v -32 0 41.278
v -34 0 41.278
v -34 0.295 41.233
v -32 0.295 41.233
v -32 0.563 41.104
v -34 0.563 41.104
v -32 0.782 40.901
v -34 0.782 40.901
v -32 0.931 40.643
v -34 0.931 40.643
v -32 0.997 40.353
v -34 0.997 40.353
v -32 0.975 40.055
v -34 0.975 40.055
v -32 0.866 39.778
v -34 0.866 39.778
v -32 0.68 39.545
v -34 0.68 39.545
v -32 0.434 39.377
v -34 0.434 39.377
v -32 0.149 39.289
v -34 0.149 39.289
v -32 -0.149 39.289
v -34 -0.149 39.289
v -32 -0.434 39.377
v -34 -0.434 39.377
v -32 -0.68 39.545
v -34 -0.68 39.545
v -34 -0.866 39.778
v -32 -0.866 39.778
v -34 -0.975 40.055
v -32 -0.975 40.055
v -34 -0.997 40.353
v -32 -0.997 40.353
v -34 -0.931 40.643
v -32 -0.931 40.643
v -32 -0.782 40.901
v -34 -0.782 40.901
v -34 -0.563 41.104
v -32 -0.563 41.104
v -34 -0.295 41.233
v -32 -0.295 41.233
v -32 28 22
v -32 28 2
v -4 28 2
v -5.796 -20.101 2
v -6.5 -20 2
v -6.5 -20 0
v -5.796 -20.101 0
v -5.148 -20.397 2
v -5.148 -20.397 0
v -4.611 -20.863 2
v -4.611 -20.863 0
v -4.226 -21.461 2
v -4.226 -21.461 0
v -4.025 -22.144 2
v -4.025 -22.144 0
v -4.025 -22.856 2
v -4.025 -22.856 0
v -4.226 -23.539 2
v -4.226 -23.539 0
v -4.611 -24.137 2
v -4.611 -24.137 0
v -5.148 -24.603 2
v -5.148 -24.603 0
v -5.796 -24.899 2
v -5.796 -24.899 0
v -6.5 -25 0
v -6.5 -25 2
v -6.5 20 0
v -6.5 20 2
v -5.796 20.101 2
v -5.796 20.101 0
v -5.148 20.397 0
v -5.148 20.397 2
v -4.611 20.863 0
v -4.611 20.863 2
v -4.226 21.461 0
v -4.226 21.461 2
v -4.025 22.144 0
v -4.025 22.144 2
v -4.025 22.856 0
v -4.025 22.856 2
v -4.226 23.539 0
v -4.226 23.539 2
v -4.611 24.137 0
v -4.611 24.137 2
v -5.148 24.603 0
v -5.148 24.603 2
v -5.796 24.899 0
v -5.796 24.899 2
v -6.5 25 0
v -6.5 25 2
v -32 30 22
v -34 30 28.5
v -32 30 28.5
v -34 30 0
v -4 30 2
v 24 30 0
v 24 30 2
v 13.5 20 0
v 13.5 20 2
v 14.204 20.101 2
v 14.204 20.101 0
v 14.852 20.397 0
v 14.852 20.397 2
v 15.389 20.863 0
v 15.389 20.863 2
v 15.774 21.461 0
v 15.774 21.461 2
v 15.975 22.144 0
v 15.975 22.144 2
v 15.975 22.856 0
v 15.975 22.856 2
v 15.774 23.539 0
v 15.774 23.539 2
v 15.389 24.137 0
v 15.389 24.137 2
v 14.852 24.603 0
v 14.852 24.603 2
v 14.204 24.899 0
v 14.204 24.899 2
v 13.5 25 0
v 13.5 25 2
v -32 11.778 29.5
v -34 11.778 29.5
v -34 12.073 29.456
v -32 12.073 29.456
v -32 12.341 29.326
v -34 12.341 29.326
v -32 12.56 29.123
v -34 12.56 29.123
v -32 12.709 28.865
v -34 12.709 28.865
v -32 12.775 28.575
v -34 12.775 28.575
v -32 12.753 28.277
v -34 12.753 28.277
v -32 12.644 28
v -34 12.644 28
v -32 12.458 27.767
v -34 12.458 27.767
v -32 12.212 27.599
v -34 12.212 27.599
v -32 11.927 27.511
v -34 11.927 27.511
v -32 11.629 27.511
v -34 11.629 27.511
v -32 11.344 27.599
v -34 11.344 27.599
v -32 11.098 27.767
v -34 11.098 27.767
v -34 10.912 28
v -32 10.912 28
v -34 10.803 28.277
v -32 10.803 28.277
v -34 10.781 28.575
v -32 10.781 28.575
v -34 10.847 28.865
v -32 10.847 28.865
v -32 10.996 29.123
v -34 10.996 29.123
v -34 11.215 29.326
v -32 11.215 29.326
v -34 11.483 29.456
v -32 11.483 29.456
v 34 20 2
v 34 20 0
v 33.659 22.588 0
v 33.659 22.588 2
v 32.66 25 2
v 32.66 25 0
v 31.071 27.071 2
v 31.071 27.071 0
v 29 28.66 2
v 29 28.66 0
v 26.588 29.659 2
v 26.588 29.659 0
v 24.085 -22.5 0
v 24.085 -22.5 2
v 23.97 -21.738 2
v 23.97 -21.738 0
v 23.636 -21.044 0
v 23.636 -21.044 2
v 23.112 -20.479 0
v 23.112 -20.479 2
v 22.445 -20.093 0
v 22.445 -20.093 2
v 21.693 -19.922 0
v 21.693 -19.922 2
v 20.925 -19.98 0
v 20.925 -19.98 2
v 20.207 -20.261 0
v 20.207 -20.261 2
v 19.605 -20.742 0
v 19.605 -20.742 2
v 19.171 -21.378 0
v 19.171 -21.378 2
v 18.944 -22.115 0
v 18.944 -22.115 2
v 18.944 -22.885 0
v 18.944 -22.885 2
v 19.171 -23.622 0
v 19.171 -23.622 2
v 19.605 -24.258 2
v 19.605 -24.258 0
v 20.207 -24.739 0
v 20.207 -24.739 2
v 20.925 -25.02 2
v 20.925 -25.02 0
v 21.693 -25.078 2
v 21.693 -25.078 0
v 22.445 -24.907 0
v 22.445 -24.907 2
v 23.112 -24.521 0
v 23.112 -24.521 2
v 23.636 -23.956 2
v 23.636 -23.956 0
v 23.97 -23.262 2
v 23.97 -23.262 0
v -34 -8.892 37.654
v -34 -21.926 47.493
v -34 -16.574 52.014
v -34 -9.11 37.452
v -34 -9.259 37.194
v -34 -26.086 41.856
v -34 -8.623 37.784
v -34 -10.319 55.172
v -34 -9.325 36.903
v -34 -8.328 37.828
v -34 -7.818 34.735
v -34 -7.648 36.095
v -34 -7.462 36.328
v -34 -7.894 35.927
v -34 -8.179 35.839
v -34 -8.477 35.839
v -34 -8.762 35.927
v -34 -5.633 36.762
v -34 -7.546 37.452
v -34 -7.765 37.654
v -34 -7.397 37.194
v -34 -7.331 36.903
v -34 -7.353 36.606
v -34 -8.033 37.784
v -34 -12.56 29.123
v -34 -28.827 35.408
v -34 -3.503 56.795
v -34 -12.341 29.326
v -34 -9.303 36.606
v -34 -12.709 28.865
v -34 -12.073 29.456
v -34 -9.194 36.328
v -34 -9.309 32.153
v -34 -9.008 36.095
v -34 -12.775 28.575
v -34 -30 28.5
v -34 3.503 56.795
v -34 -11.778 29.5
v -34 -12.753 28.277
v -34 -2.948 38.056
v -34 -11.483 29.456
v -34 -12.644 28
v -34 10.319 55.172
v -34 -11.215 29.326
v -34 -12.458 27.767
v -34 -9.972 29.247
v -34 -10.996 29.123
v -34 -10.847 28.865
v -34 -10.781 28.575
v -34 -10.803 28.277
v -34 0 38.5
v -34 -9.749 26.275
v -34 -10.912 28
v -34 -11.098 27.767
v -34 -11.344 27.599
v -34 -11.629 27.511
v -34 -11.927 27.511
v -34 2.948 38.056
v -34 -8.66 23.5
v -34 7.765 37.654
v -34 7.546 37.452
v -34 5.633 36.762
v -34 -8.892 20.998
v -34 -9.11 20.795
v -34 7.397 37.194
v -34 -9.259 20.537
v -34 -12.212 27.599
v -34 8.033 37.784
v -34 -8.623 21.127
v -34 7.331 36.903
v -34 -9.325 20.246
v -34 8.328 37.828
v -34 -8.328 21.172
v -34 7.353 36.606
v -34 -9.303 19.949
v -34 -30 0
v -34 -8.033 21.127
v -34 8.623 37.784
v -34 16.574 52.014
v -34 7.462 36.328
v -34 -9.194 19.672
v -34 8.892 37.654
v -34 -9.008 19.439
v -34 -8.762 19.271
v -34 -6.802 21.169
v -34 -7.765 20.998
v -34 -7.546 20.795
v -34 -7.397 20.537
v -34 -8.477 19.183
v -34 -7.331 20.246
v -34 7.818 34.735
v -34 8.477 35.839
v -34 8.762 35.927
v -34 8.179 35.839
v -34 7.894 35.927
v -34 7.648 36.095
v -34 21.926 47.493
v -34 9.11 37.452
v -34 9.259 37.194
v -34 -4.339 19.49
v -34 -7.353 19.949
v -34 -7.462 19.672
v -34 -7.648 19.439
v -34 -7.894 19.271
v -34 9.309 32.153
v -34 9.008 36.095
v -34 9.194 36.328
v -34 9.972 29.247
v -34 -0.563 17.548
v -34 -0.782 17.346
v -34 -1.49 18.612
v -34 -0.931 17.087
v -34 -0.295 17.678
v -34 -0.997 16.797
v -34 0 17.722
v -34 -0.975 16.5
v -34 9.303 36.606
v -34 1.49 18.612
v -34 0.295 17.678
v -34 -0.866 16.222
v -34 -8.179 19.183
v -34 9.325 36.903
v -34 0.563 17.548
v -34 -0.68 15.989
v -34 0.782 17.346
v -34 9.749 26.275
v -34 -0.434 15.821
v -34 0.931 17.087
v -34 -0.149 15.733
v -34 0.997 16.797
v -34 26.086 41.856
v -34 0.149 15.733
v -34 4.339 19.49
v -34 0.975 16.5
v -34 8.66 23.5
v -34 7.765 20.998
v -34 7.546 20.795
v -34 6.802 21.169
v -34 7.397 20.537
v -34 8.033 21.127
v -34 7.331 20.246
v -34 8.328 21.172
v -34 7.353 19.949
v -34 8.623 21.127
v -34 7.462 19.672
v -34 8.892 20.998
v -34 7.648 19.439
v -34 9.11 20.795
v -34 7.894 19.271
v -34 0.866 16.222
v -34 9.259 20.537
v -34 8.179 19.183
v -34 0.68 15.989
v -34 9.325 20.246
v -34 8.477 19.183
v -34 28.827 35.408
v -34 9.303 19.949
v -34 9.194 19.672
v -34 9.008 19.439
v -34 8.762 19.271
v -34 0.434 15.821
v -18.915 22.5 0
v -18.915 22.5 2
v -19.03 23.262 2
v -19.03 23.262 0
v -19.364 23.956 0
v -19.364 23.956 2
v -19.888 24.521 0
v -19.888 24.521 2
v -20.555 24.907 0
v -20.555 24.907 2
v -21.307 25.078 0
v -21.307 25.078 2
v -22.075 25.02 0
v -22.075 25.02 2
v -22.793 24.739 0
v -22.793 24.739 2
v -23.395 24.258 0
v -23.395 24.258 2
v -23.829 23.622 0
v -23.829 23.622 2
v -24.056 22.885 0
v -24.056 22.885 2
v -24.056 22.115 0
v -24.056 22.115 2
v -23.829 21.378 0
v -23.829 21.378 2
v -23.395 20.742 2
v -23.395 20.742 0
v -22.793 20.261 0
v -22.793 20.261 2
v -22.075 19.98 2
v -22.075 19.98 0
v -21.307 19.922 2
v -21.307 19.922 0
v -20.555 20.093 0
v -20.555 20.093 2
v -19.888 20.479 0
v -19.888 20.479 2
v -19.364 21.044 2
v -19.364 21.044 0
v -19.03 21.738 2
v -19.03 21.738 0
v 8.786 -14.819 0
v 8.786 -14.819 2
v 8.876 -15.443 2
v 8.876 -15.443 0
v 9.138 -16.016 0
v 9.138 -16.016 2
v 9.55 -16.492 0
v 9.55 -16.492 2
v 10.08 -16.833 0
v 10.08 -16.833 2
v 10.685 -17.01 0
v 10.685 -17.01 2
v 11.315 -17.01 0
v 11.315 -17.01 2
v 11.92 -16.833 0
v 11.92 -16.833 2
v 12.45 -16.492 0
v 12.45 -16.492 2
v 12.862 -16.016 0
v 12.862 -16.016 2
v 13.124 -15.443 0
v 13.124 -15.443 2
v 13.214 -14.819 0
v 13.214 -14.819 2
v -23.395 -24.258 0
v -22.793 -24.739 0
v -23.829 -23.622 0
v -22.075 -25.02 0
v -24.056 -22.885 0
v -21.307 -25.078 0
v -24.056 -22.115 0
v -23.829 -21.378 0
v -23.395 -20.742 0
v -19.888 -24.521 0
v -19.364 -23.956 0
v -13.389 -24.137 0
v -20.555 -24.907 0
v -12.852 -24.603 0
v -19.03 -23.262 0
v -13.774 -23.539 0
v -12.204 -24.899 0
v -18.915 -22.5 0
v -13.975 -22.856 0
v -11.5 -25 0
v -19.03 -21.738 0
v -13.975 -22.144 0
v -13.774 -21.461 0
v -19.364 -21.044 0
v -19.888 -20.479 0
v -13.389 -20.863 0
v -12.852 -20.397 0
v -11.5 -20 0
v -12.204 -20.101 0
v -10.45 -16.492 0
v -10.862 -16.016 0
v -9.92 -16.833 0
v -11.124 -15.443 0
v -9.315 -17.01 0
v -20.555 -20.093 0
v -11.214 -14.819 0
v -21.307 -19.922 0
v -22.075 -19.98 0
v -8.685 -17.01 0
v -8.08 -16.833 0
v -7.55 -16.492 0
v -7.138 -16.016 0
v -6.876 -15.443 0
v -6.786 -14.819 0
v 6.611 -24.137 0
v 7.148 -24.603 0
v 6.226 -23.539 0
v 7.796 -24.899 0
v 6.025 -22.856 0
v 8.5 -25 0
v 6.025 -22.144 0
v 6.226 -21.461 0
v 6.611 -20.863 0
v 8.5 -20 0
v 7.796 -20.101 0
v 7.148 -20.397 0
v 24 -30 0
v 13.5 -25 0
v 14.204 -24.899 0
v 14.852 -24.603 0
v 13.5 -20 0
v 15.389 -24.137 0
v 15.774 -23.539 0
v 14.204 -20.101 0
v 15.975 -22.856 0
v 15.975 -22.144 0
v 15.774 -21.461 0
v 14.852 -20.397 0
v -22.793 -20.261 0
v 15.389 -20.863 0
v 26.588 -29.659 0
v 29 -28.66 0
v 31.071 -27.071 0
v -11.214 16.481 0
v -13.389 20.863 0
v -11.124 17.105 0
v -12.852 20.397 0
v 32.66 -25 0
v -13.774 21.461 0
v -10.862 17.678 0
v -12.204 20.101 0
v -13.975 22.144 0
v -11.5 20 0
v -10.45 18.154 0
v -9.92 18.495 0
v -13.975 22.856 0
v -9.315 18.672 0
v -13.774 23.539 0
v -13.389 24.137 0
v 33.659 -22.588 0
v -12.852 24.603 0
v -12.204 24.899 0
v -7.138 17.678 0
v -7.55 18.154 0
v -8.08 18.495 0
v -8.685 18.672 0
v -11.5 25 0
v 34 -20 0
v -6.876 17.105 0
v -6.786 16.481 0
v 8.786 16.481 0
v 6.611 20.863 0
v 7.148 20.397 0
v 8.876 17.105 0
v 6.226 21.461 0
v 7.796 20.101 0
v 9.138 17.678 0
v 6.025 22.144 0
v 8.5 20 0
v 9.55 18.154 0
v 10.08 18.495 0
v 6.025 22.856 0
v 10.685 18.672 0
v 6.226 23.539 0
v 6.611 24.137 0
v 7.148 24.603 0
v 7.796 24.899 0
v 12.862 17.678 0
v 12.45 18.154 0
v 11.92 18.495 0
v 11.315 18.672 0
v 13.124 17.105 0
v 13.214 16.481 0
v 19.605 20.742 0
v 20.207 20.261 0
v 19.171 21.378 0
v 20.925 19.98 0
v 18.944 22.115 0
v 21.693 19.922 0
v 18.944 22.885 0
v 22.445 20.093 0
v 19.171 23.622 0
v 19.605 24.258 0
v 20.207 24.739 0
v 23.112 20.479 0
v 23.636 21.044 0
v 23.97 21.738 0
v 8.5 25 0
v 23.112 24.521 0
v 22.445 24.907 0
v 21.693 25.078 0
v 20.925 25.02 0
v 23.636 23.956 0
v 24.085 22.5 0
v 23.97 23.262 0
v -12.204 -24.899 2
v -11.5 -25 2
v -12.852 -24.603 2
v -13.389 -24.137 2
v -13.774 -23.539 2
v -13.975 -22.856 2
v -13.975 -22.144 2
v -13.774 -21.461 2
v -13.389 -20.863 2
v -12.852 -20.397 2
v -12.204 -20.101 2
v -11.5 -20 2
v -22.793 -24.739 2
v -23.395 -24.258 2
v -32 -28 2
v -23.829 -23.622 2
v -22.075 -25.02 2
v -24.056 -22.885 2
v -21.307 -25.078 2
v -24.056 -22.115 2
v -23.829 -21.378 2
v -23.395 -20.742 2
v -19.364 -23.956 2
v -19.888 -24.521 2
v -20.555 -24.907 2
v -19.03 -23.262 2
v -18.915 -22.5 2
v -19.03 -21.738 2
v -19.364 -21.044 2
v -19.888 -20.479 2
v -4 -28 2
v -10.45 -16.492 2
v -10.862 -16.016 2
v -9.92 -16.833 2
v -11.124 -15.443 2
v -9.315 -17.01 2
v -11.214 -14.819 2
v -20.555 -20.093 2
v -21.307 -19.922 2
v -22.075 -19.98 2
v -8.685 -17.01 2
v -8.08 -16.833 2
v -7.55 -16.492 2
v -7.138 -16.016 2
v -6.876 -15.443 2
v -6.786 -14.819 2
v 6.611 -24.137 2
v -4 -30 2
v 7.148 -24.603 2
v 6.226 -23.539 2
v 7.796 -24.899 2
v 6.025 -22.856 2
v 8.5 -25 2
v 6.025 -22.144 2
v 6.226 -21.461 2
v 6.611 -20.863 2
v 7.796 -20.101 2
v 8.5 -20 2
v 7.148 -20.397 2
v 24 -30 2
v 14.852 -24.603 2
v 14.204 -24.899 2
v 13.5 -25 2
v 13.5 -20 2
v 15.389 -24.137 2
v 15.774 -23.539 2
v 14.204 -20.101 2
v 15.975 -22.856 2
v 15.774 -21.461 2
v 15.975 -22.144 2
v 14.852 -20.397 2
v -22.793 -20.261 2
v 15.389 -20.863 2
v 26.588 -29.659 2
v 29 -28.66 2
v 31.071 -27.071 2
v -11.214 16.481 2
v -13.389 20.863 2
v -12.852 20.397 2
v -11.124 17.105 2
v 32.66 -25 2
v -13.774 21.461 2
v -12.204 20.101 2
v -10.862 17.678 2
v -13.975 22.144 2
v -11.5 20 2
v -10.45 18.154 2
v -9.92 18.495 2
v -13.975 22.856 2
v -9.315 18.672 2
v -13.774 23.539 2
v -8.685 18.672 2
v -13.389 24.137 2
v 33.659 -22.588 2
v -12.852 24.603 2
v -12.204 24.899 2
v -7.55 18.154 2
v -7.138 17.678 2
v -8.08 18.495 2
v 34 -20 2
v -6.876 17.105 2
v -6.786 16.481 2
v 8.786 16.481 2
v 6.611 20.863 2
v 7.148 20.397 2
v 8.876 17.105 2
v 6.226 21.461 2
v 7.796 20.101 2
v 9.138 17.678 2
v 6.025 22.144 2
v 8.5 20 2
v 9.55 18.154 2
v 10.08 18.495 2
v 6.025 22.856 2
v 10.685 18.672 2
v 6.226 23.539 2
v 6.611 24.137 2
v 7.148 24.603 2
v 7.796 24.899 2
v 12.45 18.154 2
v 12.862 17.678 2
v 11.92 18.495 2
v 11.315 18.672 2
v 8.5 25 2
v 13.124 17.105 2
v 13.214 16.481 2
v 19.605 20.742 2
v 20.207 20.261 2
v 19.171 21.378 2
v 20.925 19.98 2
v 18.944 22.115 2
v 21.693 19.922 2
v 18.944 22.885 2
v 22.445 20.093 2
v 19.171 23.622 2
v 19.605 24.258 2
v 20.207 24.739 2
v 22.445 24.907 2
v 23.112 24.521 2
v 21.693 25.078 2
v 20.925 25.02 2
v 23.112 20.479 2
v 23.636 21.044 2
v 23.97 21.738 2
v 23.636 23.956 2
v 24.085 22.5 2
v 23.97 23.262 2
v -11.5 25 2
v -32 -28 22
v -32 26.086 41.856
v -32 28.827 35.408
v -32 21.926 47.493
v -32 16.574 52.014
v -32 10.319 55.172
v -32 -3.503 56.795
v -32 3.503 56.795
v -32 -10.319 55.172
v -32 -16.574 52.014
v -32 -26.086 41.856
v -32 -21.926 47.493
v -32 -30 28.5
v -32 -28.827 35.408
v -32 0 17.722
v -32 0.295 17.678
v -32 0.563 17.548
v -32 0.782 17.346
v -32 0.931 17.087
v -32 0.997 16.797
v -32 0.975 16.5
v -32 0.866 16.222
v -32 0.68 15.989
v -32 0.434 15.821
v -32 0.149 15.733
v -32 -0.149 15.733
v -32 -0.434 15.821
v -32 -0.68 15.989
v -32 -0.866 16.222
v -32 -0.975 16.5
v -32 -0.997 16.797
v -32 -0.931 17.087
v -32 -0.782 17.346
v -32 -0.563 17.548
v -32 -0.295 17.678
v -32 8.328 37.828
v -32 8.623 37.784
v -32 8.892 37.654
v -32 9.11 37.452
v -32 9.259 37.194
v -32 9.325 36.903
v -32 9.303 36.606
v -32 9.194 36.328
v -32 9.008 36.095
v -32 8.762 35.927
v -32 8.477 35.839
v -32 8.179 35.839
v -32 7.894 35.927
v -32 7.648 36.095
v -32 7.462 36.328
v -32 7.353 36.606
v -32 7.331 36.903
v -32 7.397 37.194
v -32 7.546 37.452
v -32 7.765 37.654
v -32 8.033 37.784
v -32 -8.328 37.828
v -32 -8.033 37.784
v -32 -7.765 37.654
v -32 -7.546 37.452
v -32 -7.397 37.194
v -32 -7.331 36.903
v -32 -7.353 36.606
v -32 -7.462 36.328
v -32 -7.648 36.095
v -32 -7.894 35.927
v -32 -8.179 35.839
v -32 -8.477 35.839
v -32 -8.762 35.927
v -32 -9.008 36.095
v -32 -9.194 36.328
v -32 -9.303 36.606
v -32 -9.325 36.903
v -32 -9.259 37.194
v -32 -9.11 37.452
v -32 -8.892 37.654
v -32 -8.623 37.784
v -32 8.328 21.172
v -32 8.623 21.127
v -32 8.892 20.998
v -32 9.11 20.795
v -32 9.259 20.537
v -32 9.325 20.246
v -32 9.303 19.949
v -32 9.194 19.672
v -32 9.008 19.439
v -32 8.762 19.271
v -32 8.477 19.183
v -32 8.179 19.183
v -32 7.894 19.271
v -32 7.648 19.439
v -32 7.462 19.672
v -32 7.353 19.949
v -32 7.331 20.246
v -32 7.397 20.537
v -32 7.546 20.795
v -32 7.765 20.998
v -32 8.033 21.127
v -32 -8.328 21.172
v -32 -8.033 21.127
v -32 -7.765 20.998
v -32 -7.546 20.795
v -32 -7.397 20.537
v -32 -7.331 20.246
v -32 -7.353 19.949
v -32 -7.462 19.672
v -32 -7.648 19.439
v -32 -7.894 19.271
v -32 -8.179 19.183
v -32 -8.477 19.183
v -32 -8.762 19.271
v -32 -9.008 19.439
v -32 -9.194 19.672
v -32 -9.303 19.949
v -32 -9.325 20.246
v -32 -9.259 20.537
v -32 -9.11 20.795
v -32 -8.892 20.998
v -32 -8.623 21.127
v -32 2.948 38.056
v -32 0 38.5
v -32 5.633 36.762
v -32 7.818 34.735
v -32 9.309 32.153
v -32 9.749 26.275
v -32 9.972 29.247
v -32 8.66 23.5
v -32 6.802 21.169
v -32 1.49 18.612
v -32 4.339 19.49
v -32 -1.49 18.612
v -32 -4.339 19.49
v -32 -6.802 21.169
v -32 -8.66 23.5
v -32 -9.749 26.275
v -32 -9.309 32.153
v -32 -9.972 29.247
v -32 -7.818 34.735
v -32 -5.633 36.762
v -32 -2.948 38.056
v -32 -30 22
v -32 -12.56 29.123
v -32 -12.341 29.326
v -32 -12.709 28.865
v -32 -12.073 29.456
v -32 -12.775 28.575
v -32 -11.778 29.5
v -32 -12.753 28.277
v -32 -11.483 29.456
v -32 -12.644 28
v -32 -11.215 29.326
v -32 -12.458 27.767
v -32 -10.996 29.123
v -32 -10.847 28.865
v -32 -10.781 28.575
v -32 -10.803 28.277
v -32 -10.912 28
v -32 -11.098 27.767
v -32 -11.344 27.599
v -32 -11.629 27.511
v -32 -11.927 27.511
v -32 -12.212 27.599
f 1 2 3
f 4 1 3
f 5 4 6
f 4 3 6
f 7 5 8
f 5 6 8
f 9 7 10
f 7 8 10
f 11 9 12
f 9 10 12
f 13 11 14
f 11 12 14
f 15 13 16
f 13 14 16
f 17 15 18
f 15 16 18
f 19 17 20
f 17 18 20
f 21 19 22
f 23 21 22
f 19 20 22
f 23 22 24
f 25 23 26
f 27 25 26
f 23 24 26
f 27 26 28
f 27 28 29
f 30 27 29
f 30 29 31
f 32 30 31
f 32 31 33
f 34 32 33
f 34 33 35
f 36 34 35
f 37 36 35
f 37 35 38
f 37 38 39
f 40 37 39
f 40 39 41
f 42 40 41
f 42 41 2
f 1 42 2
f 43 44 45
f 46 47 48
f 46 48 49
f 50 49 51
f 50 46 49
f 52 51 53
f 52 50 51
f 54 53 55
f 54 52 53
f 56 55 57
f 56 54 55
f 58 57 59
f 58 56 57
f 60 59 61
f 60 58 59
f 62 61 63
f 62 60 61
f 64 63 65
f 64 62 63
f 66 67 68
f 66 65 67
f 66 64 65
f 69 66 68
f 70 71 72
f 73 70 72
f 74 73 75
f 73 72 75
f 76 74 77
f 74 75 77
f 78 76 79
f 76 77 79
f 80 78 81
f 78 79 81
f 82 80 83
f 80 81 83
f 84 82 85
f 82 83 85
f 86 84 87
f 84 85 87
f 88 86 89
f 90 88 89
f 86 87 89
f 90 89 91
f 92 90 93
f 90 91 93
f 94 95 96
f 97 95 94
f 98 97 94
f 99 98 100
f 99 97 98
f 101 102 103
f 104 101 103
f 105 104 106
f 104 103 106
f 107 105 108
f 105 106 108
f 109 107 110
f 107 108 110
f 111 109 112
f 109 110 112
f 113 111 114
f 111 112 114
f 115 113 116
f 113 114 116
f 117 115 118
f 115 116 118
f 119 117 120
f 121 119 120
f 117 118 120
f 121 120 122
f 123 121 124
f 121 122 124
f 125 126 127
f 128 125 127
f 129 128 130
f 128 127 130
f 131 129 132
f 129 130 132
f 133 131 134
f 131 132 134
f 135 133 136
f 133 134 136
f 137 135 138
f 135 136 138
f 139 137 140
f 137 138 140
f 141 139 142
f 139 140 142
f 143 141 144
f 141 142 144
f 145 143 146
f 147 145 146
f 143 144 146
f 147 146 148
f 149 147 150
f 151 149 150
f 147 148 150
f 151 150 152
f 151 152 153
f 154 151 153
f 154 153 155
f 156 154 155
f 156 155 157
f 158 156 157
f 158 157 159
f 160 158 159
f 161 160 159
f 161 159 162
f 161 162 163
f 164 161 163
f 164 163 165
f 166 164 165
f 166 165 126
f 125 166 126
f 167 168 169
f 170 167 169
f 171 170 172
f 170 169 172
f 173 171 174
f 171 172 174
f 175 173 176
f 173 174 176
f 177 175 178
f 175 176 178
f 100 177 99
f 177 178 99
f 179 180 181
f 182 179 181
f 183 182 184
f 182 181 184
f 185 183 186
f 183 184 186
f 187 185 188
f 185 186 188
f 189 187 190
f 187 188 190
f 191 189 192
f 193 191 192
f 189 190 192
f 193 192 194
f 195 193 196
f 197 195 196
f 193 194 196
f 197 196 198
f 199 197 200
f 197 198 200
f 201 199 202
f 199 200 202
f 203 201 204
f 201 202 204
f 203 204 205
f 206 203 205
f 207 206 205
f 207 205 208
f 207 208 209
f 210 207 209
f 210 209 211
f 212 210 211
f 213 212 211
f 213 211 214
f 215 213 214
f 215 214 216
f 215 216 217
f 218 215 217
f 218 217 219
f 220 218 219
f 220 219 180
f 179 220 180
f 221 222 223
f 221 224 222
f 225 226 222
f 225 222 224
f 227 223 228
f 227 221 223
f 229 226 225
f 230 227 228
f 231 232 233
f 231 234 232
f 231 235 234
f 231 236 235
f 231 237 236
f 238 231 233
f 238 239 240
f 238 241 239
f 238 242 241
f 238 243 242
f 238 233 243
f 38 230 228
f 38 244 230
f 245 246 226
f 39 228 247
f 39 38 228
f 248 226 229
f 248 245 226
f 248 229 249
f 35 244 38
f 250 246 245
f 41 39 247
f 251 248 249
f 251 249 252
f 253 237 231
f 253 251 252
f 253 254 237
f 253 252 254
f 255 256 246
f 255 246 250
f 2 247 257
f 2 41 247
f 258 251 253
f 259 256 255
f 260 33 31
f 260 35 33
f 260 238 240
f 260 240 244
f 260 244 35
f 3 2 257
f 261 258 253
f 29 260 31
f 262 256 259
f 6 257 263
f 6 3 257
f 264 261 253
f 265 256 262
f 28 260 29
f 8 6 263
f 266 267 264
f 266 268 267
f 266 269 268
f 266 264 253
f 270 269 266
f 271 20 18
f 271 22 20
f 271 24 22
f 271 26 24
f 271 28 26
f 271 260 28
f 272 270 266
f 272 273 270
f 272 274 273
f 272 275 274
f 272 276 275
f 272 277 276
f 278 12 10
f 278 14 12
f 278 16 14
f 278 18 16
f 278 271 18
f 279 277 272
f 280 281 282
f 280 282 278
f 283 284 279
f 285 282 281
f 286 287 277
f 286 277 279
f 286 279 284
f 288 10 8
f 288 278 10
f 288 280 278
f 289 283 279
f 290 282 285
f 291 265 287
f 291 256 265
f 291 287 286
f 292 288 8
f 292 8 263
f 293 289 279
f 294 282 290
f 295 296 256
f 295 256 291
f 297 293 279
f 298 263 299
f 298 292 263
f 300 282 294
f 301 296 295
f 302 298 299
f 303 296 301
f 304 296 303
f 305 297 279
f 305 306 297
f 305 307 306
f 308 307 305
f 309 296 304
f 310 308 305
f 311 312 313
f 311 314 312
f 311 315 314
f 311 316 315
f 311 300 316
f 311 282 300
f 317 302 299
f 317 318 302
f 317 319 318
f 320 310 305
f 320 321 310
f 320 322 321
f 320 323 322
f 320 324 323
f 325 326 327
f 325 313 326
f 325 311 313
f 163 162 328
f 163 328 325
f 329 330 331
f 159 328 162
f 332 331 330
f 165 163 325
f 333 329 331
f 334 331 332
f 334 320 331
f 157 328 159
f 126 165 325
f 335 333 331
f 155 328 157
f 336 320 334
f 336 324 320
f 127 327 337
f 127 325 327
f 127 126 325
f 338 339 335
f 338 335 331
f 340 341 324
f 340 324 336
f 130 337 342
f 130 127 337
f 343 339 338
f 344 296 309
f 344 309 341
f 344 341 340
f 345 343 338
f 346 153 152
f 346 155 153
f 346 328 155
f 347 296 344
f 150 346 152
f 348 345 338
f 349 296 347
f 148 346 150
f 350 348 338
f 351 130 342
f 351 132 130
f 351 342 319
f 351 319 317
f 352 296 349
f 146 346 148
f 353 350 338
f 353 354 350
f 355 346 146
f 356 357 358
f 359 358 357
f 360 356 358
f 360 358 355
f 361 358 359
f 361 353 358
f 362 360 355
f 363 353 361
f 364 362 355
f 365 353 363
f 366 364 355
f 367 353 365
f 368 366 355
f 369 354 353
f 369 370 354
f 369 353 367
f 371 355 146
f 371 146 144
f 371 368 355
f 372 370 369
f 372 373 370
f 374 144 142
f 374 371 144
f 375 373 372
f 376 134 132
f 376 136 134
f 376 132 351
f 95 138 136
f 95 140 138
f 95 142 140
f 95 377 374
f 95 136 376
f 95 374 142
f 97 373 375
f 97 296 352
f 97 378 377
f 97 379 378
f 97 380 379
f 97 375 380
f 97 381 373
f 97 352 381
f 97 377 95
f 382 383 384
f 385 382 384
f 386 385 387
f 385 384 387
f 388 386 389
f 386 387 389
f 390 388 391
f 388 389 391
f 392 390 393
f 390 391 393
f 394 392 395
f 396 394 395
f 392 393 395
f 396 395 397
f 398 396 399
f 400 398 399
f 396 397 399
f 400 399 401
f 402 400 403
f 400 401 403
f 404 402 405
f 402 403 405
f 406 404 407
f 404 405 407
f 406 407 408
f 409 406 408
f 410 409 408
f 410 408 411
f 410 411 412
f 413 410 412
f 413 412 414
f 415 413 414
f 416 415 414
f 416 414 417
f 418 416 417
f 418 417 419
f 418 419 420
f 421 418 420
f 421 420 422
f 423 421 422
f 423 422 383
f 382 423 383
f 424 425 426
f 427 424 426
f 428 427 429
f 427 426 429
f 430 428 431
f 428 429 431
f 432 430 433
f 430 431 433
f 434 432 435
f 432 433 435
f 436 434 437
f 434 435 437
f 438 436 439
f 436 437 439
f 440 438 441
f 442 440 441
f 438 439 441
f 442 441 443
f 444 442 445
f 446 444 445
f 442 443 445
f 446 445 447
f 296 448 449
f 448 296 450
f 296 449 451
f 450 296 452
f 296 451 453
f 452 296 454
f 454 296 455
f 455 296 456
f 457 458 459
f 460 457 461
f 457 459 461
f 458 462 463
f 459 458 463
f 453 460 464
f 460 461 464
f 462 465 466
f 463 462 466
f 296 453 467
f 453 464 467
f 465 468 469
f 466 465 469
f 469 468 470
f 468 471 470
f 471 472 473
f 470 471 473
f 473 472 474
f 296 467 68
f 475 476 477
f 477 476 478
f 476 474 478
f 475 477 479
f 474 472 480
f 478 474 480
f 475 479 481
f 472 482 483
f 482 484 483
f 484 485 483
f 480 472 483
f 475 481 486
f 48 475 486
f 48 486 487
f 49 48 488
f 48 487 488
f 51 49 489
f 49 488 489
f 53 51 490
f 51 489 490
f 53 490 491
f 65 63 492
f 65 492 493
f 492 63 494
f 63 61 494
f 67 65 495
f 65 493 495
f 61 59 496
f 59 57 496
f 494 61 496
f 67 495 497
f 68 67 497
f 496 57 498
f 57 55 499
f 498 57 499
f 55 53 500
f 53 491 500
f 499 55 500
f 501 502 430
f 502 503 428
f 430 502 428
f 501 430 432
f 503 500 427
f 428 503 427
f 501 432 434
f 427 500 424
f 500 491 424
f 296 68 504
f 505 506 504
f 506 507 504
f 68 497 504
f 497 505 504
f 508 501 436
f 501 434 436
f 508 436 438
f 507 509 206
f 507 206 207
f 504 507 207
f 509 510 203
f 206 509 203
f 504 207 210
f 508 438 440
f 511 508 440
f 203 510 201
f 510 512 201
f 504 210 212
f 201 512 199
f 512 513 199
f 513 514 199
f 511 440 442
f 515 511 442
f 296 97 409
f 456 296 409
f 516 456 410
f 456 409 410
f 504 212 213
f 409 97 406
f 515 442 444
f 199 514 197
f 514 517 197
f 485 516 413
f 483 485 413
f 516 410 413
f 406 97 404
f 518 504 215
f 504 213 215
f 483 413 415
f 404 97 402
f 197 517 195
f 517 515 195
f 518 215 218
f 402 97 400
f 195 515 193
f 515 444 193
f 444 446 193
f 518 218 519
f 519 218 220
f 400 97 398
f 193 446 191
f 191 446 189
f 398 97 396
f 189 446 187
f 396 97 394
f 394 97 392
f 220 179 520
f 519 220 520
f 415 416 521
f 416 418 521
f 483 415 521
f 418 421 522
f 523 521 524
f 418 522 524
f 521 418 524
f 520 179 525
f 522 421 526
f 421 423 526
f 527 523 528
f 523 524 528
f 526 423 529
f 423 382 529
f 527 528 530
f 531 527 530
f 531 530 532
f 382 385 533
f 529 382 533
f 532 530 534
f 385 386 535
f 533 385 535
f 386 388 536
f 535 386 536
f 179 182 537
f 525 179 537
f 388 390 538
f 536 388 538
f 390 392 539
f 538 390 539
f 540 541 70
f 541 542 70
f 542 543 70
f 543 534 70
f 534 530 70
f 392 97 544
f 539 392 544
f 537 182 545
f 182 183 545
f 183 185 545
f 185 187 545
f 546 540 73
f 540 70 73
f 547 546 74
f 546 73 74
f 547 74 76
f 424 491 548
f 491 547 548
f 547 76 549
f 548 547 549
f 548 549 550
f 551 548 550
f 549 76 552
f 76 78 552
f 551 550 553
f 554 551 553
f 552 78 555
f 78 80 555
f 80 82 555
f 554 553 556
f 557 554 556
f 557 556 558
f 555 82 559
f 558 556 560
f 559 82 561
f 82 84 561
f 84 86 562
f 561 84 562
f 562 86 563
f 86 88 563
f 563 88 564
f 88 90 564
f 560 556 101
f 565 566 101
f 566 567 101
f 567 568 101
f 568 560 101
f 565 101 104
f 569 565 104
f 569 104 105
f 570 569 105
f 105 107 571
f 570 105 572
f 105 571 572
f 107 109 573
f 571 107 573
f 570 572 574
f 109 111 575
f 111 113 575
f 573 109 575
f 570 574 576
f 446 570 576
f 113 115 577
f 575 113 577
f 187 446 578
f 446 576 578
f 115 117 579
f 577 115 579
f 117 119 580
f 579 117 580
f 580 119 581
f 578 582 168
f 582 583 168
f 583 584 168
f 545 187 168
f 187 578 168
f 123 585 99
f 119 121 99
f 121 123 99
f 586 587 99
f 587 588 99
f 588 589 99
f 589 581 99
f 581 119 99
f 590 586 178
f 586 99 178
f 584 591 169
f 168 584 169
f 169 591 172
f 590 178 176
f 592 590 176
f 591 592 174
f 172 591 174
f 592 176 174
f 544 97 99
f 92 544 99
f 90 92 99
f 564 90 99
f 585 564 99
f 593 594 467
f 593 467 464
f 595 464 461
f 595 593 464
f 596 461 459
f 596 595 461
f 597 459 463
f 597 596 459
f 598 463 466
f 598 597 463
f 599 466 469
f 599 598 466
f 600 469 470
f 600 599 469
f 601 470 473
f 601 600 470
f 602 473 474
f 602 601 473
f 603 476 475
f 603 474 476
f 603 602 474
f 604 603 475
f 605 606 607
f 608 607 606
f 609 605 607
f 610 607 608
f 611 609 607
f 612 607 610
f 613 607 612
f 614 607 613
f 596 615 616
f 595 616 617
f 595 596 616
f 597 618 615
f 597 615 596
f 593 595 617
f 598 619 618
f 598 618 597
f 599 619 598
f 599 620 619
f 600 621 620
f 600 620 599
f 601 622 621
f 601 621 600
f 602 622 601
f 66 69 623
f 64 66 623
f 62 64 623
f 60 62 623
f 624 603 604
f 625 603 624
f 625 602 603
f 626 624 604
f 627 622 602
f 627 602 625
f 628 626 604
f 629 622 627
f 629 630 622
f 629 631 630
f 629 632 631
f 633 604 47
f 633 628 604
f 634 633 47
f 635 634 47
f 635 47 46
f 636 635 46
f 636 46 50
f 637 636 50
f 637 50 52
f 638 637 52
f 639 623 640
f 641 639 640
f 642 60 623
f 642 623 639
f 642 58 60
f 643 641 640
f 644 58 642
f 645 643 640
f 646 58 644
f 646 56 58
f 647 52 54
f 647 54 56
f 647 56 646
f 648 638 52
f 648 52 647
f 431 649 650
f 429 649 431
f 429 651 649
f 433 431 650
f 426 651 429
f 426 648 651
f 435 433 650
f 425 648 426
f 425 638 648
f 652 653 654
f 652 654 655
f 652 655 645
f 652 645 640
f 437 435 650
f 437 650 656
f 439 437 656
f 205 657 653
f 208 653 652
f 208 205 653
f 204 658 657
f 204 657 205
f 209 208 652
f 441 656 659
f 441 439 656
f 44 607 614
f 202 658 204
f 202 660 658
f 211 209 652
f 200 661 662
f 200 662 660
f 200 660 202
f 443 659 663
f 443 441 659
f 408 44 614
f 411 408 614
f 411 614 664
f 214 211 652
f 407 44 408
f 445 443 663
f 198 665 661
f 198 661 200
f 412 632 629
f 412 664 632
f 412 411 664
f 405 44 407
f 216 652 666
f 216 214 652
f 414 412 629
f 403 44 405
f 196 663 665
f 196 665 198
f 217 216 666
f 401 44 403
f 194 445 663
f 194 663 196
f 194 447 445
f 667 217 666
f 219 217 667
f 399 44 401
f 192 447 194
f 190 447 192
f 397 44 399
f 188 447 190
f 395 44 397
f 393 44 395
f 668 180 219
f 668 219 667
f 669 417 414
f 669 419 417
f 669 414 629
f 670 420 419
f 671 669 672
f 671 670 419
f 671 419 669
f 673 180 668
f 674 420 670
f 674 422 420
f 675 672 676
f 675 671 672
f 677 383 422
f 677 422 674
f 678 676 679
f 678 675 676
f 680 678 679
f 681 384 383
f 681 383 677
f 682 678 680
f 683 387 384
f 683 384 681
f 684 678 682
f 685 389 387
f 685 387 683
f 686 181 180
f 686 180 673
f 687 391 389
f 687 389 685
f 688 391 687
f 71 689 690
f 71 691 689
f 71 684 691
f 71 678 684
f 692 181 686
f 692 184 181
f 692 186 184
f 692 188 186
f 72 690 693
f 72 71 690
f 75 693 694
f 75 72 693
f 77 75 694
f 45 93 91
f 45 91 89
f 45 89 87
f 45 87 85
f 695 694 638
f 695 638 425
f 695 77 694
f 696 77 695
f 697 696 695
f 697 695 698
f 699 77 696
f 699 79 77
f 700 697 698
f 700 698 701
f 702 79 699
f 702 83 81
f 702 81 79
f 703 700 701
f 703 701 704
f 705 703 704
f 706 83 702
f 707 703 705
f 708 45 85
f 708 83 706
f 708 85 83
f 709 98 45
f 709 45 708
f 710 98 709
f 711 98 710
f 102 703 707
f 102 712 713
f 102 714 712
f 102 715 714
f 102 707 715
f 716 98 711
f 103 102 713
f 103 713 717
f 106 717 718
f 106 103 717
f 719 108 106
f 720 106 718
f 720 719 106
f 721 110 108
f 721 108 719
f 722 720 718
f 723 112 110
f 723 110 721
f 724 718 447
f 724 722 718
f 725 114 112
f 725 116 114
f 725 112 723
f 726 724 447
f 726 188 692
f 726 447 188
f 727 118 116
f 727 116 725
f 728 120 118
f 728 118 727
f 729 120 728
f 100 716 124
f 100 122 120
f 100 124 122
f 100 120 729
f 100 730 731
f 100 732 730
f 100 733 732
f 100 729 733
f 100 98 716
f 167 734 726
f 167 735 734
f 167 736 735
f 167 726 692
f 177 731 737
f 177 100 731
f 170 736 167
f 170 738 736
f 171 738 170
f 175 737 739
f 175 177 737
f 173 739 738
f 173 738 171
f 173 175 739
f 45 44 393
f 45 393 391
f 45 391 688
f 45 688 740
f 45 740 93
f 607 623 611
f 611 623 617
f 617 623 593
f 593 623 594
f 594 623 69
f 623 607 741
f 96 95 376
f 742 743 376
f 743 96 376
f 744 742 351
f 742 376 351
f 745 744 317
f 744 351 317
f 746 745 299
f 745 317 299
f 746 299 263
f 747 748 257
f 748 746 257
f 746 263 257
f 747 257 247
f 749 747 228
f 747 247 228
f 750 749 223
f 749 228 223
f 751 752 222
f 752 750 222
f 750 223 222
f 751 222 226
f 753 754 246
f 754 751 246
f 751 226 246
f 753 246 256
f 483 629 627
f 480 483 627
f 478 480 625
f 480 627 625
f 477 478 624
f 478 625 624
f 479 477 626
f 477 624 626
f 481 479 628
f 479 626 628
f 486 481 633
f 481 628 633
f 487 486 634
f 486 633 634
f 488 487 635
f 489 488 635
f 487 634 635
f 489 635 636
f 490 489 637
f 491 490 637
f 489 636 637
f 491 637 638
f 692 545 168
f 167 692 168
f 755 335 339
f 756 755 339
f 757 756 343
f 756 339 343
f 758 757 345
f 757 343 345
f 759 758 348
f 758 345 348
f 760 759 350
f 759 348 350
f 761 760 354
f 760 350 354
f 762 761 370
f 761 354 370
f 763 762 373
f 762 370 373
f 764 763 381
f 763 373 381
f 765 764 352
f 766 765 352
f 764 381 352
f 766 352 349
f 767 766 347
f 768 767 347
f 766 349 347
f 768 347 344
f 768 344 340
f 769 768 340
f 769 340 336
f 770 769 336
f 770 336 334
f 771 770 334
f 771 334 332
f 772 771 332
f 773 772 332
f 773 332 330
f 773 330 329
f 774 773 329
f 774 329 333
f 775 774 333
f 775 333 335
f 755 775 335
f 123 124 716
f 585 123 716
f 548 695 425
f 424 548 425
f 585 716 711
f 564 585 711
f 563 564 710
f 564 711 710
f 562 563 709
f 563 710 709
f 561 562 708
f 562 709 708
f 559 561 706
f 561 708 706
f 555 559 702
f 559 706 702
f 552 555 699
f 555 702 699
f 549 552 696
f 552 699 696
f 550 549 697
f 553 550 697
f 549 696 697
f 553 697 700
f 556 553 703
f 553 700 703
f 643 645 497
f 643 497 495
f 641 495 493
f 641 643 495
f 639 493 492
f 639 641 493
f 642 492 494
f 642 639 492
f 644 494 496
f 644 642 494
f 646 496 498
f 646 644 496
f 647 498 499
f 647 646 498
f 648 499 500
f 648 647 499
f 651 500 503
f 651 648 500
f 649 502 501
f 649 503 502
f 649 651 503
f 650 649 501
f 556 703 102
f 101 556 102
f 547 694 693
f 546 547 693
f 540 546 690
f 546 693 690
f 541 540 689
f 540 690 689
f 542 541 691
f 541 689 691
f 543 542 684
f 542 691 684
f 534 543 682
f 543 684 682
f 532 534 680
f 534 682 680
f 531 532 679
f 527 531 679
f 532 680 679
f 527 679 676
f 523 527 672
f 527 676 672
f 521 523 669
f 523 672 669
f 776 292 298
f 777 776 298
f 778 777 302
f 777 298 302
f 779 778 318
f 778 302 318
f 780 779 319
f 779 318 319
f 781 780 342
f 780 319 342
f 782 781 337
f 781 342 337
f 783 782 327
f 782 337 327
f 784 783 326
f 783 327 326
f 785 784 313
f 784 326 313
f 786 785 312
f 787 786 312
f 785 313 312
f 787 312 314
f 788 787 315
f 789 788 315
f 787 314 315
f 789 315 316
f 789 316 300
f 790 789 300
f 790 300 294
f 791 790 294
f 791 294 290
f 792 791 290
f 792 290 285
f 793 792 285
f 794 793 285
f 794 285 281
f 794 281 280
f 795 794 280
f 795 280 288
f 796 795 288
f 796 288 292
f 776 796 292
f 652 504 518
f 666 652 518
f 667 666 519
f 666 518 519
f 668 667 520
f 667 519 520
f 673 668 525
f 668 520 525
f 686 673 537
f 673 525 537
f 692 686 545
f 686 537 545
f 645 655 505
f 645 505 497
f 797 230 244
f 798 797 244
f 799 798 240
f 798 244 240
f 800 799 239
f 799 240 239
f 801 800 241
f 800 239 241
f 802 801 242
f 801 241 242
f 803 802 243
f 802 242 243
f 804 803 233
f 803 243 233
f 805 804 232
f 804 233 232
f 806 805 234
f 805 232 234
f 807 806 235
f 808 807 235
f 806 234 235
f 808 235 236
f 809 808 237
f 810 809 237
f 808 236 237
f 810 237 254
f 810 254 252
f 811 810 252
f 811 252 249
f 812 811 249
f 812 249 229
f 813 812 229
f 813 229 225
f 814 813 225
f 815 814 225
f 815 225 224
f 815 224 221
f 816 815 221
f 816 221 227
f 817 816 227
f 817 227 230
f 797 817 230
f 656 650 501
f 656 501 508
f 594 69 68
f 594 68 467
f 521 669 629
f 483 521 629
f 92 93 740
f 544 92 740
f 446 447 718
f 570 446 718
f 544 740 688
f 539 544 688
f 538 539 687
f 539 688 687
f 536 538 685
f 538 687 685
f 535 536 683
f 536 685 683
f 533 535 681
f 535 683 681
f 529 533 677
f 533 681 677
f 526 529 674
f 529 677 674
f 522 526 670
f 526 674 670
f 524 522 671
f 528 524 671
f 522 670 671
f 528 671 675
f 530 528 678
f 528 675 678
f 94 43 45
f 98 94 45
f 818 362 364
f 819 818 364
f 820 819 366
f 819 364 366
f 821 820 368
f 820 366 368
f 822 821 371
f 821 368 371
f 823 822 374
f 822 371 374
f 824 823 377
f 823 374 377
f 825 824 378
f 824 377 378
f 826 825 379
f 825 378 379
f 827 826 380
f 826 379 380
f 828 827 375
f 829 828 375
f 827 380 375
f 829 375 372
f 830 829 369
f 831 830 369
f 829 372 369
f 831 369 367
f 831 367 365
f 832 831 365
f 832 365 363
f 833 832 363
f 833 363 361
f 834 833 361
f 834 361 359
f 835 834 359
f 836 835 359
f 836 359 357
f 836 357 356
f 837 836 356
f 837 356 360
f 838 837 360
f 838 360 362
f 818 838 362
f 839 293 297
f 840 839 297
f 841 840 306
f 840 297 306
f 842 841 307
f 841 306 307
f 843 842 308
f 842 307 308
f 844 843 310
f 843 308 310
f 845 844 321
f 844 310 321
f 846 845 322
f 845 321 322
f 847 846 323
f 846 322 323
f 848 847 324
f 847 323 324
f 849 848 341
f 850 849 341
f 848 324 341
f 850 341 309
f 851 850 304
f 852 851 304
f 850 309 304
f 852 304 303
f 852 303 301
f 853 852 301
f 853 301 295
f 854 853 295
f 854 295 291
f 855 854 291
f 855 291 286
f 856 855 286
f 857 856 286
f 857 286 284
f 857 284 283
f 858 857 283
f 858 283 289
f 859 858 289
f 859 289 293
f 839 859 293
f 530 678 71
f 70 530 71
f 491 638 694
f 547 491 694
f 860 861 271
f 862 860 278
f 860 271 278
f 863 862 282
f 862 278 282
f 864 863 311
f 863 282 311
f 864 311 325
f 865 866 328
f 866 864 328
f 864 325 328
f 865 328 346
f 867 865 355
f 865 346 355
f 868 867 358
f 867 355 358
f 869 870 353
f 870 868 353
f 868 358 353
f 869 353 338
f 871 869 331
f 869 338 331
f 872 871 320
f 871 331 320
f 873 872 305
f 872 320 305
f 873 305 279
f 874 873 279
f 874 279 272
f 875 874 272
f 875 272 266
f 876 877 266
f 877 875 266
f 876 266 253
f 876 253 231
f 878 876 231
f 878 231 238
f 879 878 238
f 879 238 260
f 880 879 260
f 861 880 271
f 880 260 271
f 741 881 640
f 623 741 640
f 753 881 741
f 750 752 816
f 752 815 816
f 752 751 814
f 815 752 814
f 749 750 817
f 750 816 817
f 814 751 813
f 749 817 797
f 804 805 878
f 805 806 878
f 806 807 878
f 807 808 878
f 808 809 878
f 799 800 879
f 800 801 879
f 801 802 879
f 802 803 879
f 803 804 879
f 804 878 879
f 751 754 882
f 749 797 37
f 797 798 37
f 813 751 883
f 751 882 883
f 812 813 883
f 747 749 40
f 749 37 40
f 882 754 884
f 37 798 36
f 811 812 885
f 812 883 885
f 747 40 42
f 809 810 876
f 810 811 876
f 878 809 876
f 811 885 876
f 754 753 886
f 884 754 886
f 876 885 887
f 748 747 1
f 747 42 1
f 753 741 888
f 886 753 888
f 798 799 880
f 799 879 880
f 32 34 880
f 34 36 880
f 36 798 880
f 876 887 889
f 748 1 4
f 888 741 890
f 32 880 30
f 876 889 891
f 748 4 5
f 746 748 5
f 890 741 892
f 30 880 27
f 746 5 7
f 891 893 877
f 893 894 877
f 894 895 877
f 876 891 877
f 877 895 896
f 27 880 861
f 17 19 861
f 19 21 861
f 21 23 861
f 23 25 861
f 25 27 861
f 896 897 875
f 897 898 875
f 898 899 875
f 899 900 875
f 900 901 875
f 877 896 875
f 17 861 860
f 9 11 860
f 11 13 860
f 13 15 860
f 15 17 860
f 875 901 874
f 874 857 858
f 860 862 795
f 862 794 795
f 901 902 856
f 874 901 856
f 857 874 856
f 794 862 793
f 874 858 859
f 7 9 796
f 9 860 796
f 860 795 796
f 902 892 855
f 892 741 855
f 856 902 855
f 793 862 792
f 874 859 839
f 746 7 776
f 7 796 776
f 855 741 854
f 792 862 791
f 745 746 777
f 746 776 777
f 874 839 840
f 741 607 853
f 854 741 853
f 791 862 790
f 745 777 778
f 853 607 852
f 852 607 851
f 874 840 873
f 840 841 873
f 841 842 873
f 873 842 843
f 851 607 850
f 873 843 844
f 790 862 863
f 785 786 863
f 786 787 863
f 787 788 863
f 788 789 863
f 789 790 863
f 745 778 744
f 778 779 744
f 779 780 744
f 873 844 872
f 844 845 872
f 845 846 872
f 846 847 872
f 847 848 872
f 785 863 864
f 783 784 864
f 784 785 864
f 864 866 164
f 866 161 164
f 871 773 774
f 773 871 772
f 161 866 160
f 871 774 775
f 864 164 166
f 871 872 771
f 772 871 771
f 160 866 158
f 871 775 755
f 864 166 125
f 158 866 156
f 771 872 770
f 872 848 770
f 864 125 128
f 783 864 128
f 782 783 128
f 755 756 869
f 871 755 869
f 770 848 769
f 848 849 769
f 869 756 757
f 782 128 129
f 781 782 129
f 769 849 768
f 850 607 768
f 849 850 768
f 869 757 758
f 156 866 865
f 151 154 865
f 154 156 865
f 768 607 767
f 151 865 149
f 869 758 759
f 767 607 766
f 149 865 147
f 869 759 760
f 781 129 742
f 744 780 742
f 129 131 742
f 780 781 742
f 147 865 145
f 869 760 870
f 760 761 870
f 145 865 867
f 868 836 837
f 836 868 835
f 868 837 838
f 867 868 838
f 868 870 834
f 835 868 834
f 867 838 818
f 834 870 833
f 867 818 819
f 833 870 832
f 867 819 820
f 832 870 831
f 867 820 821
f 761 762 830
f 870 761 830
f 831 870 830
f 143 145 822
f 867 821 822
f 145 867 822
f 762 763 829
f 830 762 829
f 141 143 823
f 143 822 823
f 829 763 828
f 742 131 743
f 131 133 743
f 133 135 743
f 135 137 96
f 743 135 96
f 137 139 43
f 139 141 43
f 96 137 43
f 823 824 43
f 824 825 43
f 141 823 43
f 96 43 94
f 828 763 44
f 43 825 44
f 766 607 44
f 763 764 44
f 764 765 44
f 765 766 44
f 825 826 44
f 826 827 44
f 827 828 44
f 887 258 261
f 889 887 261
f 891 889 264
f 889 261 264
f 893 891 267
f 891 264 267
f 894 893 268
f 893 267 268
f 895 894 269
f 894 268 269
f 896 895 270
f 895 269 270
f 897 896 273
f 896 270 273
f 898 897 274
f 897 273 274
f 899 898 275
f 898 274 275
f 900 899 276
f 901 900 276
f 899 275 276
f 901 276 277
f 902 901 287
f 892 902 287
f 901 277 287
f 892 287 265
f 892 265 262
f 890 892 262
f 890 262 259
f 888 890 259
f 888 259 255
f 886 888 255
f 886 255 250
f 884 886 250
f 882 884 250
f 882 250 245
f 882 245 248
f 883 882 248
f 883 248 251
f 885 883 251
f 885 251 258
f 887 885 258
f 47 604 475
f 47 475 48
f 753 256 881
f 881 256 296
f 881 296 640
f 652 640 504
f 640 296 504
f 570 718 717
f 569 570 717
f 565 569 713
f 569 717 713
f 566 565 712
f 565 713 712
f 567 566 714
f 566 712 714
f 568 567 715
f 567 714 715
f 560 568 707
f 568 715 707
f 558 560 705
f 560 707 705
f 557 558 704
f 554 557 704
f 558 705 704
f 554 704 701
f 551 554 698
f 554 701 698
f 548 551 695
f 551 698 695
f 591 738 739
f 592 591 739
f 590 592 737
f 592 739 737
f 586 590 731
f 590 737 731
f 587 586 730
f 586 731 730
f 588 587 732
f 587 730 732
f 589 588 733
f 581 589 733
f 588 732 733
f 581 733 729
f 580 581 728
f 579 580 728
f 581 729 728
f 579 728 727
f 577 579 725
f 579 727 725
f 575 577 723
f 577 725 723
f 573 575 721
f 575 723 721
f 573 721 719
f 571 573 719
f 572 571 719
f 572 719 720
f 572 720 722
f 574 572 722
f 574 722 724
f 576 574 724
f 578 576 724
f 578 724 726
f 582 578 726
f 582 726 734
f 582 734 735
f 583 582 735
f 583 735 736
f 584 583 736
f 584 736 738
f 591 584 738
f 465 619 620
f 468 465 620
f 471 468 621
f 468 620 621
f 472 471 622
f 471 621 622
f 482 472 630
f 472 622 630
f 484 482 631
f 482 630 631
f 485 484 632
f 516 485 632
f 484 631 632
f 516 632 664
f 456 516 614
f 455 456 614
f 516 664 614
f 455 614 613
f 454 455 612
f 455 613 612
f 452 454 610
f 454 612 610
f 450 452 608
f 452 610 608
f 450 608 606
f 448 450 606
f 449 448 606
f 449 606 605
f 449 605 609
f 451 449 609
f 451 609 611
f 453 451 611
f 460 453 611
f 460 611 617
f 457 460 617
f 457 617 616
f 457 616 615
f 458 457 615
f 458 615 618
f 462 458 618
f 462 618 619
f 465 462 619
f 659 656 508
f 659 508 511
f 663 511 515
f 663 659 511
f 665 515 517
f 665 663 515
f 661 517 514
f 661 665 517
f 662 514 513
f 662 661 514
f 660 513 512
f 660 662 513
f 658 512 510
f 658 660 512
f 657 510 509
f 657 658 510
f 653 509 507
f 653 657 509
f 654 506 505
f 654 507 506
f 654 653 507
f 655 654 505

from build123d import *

# Parameters (mm, degrees)
BOSS_EXTRUDE1_DEPTH = 2
SKETCH5_W           = 2
SKETCH5_H           = 60
BOSS_EXTRUDE2_DEPTH = 55
SKETCH6_R           = 10
SKETCH6_R_2         = 1
CUT_EXTRUDE2_DEPTH  = 55
SKETCH8_R           = 2.585315043
CUT_EXTRUDE3_DEPTH  = 55
SKETCH4_W           = 30
SKETCH4_H           = 2
BOSS_EXTRUDE3_DEPTH = 20
CUT_EXTRUDE4_DEPTH  = 100


with BuildPart() as part:
    # Sketch2 → Boss-Extrude1 (new body)
    with BuildSketch(Plane.XY):
        with BuildLine():
            Line((-34, -30), (24, -30))
            ThreePointArc((24, -30), (31.071067812, -27.071067812), (34, -20))
            Line((34, -20), (34, 20))
            ThreePointArc((34, 20), (31.071067812, 27.071067812), (24, 30))
            Line((24, 30), (-34, 30))
            Line((-34, 30), (-34, -30))
        make_face()
    extrude(amount=BOSS_EXTRUDE1_DEPTH)

    # Sketch5 → Boss-Extrude2 (add)
    with BuildSketch(Plane.XY.offset(2)):
        with Locations((-33, 0)):
            Rectangle(SKETCH5_W, SKETCH5_H)
    extrude(amount=BOSS_EXTRUDE2_DEPTH)

    # Sketch6 → Cut-Extrude2 (cut)
    with BuildSketch(Plane.ZY.offset(34)):
        with Locations((28.5, 0)):
            Circle(SKETCH6_R)
        with Locations((40.277915604, 0)):
            Circle(SKETCH6_R_2)
        with Locations((36.828243992, -8.328243992)):
            Circle(SKETCH6_R_2)
        with Locations((28.5, -11.777915604)):
            Circle(SKETCH6_R_2)
        with Locations((20.171756008, -8.328243992)):
            Circle(SKETCH6_R_2)
        with Locations((16.722084396, 0)):
            Circle(SKETCH6_R_2)
        with Locations((20.171756008, 8.328243992)):
            Circle(SKETCH6_R_2)
        with Locations((28.5, 11.777915604)):
            Circle(SKETCH6_R_2)
        with Locations((36.828243992, 8.328243992)):
            Circle(SKETCH6_R_2)
        with BuildLine():
            Line((57, 30), (28.5, 30))
            ThreePointArc((28.5, 30), (48.739127681, 20.68967138), (57, 1.21e-07))
            Line((57, 1.21e-07), (57, 30))
        make_face()
        with BuildLine():
            Line((57, -30), (57, 1.21e-07))
            ThreePointArc((57, 1.21e-07), (48.739127764, -20.689671292), (28.5, -30))
            Line((28.5, -30), (57, -30))
        make_face()
    extrude(amount=-CUT_EXTRUDE2_DEPTH, mode=Mode.SUBTRACT)

    # Sketch8 → Cut-Extrude3 (cut)
    with BuildSketch(Plane.XY.offset(2)):
        with Locations((-21.5, 22.5)):
            Circle(SKETCH8_R)
        with BuildLine():
            Line((-11.5, 20), (-6.5, 20))
            ThreePointArc((-6.5, 20), (-4, 22.5), (-6.5, 25))
            Line((-6.5, 25), (-11.5, 25))
            ThreePointArc((-11.5, 25), (-14, 22.5), (-11.5, 20))
        make_face()
        with BuildLine():
            Line((8.5, 20), (13.5, 20))
            ThreePointArc((13.5, 20), (16, 22.5), (13.5, 25))
            Line((13.5, 25), (8.5, 25))
            ThreePointArc((8.5, 25), (6, 22.5), (8.5, 20))
        make_face()
        with Locations((21.5, 22.5)):
            Circle(SKETCH8_R)
        with BuildLine():
            Line((8.786451989, 16.481383401), (8.786451989, -14.819395159))
            ThreePointArc((8.786451989, -14.819395159), (11, -17.03294317), (13.213548011, -14.819395159))
            Line((13.213548011, -14.819395159), (13.213548011, 16.481383401))
            ThreePointArc((13.213548011, 16.481383401), (11, 18.694931413), (8.786451989, 16.481383401))
        make_face()
        with BuildLine():
            Line((-11.213548011, 16.481383401), (-11.213548011, -14.819395159))
            ThreePointArc((-11.213548011, -14.819395159), (-9, -17.03294317), (-6.786451989, -14.819395159))
            Line((-6.786451989, -14.819395159), (-6.786451989, 16.481383401))
            ThreePointArc((-6.786451989, 16.481383401), (-9, 18.694931413), (-11.213548011, 16.481383401))
        make_face()
        with Locations((-21.5, -22.5)):
            Circle(SKETCH8_R)
        with BuildLine():
            ThreePointArc((-6.5, -20), (-4, -22.5), (-6.5, -25))
            Line((-6.5, -25), (-11.5, -25))
            ThreePointArc((-11.5, -25), (-14, -22.5), (-11.5, -20))
            Line((-11.5, -20), (-6.5, -20))
        make_face()
        with BuildLine():
            ThreePointArc((13.5, -20), (16, -22.5), (13.5, -25))
            Line((13.5, -25), (8.5, -25))
            ThreePointArc((8.5, -25), (6, -22.5), (8.5, -20))
            Line((8.5, -20), (13.5, -20))
        make_face()
        with Locations((21.5, -22.5)):
            Circle(SKETCH8_R)
    extrude(amount=-CUT_EXTRUDE3_DEPTH, mode=Mode.SUBTRACT)

    # Sketch4 → Boss-Extrude3 (add)
    with BuildSketch(Plane.XY.offset(2)):
        with Locations((-19, -29)):
            Rectangle(SKETCH4_W, SKETCH4_H)
        with Locations((-19, 29)):
            Rectangle(SKETCH4_W, SKETCH4_H)
    extrude(amount=BOSS_EXTRUDE3_DEPTH)

    # Sketch10 → Cut-Extrude4 (cut)
    with BuildSketch(Plane.XZ.offset(30)):
        Polygon((-32, 22), (-4, 2), (-4, 22), align=None)
    extrude(amount=-CUT_EXTRUDE4_DEPTH, mode=Mode.SUBTRACT)


solid = part.part
